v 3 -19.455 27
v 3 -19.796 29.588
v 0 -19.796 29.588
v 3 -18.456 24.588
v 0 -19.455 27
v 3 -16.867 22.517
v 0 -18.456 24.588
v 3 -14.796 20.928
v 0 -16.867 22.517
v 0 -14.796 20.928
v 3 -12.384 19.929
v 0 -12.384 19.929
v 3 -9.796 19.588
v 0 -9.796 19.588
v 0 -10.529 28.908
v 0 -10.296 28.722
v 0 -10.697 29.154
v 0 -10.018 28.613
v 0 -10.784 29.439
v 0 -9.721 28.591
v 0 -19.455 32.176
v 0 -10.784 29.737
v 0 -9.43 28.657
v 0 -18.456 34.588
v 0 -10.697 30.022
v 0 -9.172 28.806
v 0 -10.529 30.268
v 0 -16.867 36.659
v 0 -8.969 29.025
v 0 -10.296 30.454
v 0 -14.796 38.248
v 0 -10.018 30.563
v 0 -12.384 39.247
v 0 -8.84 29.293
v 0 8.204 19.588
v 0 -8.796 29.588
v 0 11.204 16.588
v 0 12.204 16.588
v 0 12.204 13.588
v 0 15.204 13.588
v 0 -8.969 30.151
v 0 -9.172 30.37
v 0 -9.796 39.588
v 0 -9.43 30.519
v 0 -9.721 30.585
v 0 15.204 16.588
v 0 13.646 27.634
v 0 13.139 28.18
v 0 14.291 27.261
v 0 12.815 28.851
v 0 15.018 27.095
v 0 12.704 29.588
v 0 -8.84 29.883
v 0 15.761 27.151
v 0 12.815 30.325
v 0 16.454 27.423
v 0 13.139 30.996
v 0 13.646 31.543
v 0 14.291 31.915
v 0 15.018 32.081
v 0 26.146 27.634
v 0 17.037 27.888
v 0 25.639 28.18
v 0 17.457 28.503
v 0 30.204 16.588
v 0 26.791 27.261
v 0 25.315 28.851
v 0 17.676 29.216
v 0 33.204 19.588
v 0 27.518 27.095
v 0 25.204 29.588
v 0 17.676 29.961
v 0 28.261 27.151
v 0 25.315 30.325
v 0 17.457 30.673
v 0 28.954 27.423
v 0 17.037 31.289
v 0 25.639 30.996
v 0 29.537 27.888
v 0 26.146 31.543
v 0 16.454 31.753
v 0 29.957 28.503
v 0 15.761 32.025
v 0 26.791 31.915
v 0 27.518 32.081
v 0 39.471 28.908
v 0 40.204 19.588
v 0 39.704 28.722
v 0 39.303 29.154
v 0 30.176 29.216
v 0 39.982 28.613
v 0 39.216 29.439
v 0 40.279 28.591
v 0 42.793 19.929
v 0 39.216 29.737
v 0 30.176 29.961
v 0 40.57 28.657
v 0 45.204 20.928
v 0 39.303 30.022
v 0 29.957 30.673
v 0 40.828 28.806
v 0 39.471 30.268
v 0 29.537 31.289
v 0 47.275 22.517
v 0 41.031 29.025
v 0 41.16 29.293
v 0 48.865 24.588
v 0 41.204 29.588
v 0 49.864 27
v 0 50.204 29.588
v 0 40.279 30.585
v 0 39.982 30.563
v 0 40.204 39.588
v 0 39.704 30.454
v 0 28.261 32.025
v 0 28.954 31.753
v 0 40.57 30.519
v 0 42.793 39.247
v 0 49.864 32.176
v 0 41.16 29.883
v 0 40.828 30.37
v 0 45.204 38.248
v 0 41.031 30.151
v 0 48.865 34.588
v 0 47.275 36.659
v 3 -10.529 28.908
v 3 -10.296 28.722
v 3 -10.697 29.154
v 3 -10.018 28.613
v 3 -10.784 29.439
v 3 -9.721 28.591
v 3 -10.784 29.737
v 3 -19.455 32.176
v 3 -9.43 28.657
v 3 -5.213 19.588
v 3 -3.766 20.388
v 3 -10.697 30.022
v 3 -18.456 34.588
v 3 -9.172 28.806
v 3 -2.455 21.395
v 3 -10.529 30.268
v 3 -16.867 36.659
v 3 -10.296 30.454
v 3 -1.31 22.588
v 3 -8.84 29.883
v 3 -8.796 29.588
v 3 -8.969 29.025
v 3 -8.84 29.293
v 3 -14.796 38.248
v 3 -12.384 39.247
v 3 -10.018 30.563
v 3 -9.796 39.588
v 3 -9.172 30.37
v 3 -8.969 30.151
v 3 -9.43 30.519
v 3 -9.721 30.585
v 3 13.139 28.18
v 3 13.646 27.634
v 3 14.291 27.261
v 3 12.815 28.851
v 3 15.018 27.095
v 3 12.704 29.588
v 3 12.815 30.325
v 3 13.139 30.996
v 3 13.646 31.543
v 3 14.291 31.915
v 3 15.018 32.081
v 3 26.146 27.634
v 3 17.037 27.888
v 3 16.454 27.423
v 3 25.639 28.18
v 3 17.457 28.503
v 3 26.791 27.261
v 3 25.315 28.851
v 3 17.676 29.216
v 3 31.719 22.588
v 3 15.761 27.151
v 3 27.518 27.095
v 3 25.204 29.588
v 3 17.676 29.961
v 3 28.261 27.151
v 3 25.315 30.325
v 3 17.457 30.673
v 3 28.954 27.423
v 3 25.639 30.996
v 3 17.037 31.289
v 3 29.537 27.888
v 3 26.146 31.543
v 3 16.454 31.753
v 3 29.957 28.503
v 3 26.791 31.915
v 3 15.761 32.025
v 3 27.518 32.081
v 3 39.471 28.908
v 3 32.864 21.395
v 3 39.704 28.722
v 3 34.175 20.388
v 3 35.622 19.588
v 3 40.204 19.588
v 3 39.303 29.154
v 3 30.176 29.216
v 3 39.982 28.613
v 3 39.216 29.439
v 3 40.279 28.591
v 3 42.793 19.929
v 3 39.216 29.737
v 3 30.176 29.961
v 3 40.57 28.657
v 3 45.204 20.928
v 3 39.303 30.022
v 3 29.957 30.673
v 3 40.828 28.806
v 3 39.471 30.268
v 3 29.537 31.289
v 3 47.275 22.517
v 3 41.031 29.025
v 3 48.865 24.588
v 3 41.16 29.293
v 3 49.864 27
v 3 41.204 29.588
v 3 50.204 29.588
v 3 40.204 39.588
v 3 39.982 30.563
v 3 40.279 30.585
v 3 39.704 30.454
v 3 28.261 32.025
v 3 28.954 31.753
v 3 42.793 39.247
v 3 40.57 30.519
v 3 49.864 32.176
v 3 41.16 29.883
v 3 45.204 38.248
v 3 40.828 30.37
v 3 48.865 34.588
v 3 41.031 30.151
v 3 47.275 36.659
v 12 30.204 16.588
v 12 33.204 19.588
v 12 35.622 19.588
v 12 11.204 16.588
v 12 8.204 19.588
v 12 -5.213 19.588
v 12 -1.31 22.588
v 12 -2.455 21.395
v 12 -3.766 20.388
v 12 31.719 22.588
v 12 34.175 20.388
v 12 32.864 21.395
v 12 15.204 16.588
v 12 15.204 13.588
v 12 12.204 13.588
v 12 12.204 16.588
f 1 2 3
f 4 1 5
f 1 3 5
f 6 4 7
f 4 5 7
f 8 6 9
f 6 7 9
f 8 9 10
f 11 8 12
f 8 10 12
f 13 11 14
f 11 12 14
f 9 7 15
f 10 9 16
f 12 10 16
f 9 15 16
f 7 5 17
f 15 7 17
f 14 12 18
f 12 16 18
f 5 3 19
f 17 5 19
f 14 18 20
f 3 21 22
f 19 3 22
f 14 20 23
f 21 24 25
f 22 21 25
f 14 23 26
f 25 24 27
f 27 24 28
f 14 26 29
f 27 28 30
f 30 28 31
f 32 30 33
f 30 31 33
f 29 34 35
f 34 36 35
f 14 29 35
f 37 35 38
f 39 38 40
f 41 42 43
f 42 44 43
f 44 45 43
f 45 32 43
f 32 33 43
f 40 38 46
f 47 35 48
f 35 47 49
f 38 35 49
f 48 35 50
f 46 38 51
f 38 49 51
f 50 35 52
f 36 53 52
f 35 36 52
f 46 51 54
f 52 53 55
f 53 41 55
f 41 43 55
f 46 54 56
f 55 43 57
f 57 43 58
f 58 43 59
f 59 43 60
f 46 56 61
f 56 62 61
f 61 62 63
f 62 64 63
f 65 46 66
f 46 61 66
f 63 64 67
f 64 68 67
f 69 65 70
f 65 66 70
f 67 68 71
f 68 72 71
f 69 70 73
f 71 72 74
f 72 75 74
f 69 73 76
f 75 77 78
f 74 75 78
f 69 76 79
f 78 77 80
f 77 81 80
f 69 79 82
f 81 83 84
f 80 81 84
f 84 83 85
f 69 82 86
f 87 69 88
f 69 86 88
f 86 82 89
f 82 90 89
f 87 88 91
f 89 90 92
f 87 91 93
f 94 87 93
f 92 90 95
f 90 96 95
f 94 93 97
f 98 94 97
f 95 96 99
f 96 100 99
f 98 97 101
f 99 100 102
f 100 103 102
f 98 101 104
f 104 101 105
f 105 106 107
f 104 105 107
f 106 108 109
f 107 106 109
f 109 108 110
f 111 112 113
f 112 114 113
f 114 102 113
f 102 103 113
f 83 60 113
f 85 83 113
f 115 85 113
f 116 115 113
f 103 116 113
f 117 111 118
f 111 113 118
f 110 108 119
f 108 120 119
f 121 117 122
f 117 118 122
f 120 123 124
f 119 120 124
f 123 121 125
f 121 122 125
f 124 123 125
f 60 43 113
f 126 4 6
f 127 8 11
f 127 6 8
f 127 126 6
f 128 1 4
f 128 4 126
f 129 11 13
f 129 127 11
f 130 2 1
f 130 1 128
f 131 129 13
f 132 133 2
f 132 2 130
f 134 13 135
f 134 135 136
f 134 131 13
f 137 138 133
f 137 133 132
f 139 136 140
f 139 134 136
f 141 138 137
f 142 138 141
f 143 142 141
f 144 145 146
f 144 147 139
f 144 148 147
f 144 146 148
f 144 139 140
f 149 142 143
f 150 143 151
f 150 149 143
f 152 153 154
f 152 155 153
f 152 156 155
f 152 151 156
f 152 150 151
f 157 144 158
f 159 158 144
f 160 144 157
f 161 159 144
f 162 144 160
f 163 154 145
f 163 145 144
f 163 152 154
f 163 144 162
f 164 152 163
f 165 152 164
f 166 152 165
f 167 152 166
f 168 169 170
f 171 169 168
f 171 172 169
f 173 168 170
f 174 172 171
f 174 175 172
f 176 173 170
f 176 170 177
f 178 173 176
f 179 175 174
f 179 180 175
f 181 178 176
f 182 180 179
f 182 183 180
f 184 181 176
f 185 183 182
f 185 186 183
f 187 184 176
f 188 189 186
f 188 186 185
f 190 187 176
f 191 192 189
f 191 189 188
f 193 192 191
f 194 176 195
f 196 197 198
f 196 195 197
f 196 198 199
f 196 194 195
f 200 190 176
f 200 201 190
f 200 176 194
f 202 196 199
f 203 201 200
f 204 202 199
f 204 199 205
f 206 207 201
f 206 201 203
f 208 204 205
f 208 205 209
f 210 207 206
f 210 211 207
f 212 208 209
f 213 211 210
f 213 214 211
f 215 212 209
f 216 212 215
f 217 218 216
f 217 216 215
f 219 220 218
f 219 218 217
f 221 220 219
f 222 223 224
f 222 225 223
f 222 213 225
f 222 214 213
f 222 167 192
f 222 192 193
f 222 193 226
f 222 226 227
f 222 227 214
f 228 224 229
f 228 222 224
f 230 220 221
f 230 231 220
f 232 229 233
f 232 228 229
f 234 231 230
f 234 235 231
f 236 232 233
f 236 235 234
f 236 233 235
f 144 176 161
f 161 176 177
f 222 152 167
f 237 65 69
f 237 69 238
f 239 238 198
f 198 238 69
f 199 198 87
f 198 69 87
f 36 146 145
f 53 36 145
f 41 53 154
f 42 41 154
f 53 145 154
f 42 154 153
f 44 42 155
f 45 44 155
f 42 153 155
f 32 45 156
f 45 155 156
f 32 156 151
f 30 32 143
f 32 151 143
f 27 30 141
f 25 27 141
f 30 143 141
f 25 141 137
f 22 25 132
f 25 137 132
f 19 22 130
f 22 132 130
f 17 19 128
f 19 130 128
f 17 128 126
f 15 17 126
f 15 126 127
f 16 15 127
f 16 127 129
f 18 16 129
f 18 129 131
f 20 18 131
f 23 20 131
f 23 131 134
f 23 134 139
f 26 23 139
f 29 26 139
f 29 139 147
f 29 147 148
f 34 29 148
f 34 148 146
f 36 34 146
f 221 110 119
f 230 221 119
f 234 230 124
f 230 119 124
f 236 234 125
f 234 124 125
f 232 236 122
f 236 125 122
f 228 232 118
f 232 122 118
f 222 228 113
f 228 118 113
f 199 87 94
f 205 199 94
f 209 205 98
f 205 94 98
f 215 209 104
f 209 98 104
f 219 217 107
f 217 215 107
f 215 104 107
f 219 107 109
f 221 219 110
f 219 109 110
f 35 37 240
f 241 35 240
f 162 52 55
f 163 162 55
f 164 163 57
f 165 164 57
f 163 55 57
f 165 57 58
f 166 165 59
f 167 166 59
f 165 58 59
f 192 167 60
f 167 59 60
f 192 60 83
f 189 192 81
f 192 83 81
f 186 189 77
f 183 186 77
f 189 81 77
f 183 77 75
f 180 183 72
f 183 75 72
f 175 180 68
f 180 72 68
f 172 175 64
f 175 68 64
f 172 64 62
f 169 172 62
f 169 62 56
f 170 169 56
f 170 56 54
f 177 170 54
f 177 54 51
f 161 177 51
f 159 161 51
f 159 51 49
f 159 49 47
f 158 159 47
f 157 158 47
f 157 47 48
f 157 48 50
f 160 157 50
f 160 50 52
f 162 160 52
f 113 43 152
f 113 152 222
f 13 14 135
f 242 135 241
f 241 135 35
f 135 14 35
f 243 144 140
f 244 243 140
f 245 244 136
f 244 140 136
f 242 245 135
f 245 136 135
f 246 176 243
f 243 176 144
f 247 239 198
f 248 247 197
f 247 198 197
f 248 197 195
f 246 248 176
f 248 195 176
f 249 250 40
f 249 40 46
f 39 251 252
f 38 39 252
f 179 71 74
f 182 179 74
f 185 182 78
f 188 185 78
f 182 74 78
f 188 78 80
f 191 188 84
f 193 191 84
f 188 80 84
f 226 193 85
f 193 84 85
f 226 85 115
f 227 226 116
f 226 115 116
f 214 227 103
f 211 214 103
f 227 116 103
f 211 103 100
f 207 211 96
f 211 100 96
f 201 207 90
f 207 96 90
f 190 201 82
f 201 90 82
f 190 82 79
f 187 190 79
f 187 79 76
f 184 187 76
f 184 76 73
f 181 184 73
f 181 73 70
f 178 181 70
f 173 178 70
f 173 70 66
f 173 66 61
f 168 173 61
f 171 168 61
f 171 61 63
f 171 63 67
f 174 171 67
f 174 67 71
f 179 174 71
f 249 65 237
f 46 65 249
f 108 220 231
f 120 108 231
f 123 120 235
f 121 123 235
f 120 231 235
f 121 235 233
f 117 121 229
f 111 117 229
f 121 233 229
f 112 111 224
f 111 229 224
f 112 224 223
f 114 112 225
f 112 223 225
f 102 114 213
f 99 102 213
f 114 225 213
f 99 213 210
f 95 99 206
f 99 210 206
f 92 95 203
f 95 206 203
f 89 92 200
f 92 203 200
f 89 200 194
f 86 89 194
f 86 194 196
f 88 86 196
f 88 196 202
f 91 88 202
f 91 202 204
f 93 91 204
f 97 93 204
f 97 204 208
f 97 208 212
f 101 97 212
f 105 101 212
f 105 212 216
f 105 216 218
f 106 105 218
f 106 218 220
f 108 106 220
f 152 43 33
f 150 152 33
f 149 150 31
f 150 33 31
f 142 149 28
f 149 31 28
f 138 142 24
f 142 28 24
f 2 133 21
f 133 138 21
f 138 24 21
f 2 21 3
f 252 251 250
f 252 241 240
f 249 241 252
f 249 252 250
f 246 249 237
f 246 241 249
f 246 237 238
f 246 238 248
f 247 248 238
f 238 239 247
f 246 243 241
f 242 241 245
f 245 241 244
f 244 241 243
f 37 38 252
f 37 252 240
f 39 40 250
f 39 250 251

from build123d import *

# Parameters (mm, degrees)
F0_W      = 70
F0_H      = 20
F1_DEPTH  = 3
F3_DEPTH  = 9
F5_DEPTH  = 25
F6_R      = 1
F7_DEPTH  = 25
F8_R      = 2.5
F9_DEPTH  = 25
F10_W     = 3
F10_H     = 3
F11_DEPTH = 12
F12_SIZE  = 2.99999


# Not quite as in the source:
# - a fillet or chamfer is up to 0.001 mm smaller than in the source, because OpenCascade refuses the exact size


with BuildPart() as f1:
    # F0 (on Right) → F1 (new body)
    with BuildSketch(Plane.YZ):
        with Locations((15.2043993567, 29.5881517231)):
            Rectangle(F0_W, F0_H)
    extrude(amount=F1_DEPTH)

    # F2 (on face) → F3 (join)
    with BuildSketch(Plane.YZ.offset(3)):
        with BuildLine():
            ThreePointArc((-1.3103192691, 22.5881517231), (-3.0917046048, 20.8670406755), (-5.2130249484, 19.5881517231))
            Line((-5.2130249484, 19.5881517231), (0.2043993567, 19.5881517231))
            Line((0.2043993567, 19.5881517231), (0.2043993567, 22.5881517231))
            Line((0.2043993567, 22.5881517231), (-1.3103192691, 22.5881517231))
        make_face()
        with BuildLine():
            Line((0.2043993567, 22.5881517231), (0.2043993567, 19.5881517231))
            Line((0.2043993567, 19.5881517231), (35.6218236617, 19.5881517231))
            ThreePointArc((35.6218236617, 19.5881517231), (33.5005033181, 20.8670406755), (31.7191179824, 22.5881517231))
            Line((31.7191179824, 22.5881517231), (0.2043993567, 22.5881517231))
        make_face()
    extrude(amount=F3_DEPTH)

    # F4 (on face) → F5 (cut)
    with BuildSketch(Plane(origin=(0, 0, 0), x_dir=(0, -1, 0), z_dir=(-1, 0, 0))):
        with BuildLine():
            Line((19.7956006433, 29.5881517231), (19.7956006433, 39.5881517231))
            Line((19.7956006433, 39.5881517231), (9.7956006433, 39.5881517231))
            ThreePointArc((9.7956006433, 39.5881517231), (16.8666684552, 36.659219535), (19.7956006433, 29.5881517231))
        make_face()
        with BuildLine():
            Line((19.7956006433, 19.5881517231), (19.7956006433, 29.5881517231))
            ThreePointArc((19.7956006433, 29.5881517231), (16.8666684552, 22.5170839113), (9.7956006433, 19.5881517231))
            Line((9.7956006433, 19.5881517231), (19.7956006433, 19.5881517231))
        make_face()
        with BuildLine():
            ThreePointArc((-50.2043993567, 29.5881517231), (-47.2754671685, 36.659219535), (-40.2043993567, 39.5881517231))
            Line((-40.2043993567, 39.5881517231), (-50.2043993567, 39.5881517231))
            Line((-50.2043993567, 39.5881517231), (-50.2043993567, 29.5881517231))
        make_face()
        with BuildLine():
            ThreePointArc((-40.2043993567, 19.5881517231), (-47.2754671685, 22.5170839113), (-50.2043993567, 29.5881517231))
            Line((-50.2043993567, 29.5881517231), (-50.2043993567, 19.5881517231))
            Line((-50.2043993567, 19.5881517231), (-40.2043993567, 19.5881517231))
        make_face()
    extrude(amount=-F5_DEPTH, mode=Mode.SUBTRACT)

    # F6 (on face) → F7 (cut)
    with BuildSketch(Plane.YZ.offset(3)):
        with Locations((-9.7956006433, 29.5881517231)):
            Circle(F6_R)
        with Locations((40.2043993567, 29.5881517231)):
            Circle(F6_R)
    extrude(amount=-F7_DEPTH, mode=Mode.SUBTRACT)

    # F8 (on face) → F9 (cut)
    with BuildSketch(Plane(origin=(0, 0, 0), x_dir=(0, -1, 0), z_dir=(-1, 0, 0))):
        with Locations((-27.7043993567, 29.5881517231)):
            Circle(F8_R)
        with Locations((-15.2043993567, 29.5881517231)):
            Circle(F8_R)
    extrude(amount=-F9_DEPTH, mode=Mode.SUBTRACT)

    # F10 (on face) → F11 (join)
    with BuildSketch(Plane(origin=(0, 0, 0), x_dir=(0, -1, 0), z_dir=(-1, 0, 0))):
        Polygon((-8.2043993567, 16.5881517231), (-8.2043993567, 19.5881517231), (-33.2043993567, 19.5881517231), (-33.2043993567, 16.5881517231), (-15.2043993567, 16.5881517231), (-12.2043993567, 16.5881517231), align=None)
        with Locations((-13.7043993567, 15.0881517231)):
            Rectangle(F10_W, F10_H)
    extrude(amount=-F11_DEPTH)

    # F12 (size 3 in the source; OpenCascade refuses exactly that, so slightly less here)
    f12_edges = [f1.edges().sort_by_distance(p)[0] for p in [
        (6, 8.204399, 16.588152),
        (6, 33.204399, 16.588152),
    ]]
    chamfer(f12_edges, length=F12_SIZE)


solid = f1.part
